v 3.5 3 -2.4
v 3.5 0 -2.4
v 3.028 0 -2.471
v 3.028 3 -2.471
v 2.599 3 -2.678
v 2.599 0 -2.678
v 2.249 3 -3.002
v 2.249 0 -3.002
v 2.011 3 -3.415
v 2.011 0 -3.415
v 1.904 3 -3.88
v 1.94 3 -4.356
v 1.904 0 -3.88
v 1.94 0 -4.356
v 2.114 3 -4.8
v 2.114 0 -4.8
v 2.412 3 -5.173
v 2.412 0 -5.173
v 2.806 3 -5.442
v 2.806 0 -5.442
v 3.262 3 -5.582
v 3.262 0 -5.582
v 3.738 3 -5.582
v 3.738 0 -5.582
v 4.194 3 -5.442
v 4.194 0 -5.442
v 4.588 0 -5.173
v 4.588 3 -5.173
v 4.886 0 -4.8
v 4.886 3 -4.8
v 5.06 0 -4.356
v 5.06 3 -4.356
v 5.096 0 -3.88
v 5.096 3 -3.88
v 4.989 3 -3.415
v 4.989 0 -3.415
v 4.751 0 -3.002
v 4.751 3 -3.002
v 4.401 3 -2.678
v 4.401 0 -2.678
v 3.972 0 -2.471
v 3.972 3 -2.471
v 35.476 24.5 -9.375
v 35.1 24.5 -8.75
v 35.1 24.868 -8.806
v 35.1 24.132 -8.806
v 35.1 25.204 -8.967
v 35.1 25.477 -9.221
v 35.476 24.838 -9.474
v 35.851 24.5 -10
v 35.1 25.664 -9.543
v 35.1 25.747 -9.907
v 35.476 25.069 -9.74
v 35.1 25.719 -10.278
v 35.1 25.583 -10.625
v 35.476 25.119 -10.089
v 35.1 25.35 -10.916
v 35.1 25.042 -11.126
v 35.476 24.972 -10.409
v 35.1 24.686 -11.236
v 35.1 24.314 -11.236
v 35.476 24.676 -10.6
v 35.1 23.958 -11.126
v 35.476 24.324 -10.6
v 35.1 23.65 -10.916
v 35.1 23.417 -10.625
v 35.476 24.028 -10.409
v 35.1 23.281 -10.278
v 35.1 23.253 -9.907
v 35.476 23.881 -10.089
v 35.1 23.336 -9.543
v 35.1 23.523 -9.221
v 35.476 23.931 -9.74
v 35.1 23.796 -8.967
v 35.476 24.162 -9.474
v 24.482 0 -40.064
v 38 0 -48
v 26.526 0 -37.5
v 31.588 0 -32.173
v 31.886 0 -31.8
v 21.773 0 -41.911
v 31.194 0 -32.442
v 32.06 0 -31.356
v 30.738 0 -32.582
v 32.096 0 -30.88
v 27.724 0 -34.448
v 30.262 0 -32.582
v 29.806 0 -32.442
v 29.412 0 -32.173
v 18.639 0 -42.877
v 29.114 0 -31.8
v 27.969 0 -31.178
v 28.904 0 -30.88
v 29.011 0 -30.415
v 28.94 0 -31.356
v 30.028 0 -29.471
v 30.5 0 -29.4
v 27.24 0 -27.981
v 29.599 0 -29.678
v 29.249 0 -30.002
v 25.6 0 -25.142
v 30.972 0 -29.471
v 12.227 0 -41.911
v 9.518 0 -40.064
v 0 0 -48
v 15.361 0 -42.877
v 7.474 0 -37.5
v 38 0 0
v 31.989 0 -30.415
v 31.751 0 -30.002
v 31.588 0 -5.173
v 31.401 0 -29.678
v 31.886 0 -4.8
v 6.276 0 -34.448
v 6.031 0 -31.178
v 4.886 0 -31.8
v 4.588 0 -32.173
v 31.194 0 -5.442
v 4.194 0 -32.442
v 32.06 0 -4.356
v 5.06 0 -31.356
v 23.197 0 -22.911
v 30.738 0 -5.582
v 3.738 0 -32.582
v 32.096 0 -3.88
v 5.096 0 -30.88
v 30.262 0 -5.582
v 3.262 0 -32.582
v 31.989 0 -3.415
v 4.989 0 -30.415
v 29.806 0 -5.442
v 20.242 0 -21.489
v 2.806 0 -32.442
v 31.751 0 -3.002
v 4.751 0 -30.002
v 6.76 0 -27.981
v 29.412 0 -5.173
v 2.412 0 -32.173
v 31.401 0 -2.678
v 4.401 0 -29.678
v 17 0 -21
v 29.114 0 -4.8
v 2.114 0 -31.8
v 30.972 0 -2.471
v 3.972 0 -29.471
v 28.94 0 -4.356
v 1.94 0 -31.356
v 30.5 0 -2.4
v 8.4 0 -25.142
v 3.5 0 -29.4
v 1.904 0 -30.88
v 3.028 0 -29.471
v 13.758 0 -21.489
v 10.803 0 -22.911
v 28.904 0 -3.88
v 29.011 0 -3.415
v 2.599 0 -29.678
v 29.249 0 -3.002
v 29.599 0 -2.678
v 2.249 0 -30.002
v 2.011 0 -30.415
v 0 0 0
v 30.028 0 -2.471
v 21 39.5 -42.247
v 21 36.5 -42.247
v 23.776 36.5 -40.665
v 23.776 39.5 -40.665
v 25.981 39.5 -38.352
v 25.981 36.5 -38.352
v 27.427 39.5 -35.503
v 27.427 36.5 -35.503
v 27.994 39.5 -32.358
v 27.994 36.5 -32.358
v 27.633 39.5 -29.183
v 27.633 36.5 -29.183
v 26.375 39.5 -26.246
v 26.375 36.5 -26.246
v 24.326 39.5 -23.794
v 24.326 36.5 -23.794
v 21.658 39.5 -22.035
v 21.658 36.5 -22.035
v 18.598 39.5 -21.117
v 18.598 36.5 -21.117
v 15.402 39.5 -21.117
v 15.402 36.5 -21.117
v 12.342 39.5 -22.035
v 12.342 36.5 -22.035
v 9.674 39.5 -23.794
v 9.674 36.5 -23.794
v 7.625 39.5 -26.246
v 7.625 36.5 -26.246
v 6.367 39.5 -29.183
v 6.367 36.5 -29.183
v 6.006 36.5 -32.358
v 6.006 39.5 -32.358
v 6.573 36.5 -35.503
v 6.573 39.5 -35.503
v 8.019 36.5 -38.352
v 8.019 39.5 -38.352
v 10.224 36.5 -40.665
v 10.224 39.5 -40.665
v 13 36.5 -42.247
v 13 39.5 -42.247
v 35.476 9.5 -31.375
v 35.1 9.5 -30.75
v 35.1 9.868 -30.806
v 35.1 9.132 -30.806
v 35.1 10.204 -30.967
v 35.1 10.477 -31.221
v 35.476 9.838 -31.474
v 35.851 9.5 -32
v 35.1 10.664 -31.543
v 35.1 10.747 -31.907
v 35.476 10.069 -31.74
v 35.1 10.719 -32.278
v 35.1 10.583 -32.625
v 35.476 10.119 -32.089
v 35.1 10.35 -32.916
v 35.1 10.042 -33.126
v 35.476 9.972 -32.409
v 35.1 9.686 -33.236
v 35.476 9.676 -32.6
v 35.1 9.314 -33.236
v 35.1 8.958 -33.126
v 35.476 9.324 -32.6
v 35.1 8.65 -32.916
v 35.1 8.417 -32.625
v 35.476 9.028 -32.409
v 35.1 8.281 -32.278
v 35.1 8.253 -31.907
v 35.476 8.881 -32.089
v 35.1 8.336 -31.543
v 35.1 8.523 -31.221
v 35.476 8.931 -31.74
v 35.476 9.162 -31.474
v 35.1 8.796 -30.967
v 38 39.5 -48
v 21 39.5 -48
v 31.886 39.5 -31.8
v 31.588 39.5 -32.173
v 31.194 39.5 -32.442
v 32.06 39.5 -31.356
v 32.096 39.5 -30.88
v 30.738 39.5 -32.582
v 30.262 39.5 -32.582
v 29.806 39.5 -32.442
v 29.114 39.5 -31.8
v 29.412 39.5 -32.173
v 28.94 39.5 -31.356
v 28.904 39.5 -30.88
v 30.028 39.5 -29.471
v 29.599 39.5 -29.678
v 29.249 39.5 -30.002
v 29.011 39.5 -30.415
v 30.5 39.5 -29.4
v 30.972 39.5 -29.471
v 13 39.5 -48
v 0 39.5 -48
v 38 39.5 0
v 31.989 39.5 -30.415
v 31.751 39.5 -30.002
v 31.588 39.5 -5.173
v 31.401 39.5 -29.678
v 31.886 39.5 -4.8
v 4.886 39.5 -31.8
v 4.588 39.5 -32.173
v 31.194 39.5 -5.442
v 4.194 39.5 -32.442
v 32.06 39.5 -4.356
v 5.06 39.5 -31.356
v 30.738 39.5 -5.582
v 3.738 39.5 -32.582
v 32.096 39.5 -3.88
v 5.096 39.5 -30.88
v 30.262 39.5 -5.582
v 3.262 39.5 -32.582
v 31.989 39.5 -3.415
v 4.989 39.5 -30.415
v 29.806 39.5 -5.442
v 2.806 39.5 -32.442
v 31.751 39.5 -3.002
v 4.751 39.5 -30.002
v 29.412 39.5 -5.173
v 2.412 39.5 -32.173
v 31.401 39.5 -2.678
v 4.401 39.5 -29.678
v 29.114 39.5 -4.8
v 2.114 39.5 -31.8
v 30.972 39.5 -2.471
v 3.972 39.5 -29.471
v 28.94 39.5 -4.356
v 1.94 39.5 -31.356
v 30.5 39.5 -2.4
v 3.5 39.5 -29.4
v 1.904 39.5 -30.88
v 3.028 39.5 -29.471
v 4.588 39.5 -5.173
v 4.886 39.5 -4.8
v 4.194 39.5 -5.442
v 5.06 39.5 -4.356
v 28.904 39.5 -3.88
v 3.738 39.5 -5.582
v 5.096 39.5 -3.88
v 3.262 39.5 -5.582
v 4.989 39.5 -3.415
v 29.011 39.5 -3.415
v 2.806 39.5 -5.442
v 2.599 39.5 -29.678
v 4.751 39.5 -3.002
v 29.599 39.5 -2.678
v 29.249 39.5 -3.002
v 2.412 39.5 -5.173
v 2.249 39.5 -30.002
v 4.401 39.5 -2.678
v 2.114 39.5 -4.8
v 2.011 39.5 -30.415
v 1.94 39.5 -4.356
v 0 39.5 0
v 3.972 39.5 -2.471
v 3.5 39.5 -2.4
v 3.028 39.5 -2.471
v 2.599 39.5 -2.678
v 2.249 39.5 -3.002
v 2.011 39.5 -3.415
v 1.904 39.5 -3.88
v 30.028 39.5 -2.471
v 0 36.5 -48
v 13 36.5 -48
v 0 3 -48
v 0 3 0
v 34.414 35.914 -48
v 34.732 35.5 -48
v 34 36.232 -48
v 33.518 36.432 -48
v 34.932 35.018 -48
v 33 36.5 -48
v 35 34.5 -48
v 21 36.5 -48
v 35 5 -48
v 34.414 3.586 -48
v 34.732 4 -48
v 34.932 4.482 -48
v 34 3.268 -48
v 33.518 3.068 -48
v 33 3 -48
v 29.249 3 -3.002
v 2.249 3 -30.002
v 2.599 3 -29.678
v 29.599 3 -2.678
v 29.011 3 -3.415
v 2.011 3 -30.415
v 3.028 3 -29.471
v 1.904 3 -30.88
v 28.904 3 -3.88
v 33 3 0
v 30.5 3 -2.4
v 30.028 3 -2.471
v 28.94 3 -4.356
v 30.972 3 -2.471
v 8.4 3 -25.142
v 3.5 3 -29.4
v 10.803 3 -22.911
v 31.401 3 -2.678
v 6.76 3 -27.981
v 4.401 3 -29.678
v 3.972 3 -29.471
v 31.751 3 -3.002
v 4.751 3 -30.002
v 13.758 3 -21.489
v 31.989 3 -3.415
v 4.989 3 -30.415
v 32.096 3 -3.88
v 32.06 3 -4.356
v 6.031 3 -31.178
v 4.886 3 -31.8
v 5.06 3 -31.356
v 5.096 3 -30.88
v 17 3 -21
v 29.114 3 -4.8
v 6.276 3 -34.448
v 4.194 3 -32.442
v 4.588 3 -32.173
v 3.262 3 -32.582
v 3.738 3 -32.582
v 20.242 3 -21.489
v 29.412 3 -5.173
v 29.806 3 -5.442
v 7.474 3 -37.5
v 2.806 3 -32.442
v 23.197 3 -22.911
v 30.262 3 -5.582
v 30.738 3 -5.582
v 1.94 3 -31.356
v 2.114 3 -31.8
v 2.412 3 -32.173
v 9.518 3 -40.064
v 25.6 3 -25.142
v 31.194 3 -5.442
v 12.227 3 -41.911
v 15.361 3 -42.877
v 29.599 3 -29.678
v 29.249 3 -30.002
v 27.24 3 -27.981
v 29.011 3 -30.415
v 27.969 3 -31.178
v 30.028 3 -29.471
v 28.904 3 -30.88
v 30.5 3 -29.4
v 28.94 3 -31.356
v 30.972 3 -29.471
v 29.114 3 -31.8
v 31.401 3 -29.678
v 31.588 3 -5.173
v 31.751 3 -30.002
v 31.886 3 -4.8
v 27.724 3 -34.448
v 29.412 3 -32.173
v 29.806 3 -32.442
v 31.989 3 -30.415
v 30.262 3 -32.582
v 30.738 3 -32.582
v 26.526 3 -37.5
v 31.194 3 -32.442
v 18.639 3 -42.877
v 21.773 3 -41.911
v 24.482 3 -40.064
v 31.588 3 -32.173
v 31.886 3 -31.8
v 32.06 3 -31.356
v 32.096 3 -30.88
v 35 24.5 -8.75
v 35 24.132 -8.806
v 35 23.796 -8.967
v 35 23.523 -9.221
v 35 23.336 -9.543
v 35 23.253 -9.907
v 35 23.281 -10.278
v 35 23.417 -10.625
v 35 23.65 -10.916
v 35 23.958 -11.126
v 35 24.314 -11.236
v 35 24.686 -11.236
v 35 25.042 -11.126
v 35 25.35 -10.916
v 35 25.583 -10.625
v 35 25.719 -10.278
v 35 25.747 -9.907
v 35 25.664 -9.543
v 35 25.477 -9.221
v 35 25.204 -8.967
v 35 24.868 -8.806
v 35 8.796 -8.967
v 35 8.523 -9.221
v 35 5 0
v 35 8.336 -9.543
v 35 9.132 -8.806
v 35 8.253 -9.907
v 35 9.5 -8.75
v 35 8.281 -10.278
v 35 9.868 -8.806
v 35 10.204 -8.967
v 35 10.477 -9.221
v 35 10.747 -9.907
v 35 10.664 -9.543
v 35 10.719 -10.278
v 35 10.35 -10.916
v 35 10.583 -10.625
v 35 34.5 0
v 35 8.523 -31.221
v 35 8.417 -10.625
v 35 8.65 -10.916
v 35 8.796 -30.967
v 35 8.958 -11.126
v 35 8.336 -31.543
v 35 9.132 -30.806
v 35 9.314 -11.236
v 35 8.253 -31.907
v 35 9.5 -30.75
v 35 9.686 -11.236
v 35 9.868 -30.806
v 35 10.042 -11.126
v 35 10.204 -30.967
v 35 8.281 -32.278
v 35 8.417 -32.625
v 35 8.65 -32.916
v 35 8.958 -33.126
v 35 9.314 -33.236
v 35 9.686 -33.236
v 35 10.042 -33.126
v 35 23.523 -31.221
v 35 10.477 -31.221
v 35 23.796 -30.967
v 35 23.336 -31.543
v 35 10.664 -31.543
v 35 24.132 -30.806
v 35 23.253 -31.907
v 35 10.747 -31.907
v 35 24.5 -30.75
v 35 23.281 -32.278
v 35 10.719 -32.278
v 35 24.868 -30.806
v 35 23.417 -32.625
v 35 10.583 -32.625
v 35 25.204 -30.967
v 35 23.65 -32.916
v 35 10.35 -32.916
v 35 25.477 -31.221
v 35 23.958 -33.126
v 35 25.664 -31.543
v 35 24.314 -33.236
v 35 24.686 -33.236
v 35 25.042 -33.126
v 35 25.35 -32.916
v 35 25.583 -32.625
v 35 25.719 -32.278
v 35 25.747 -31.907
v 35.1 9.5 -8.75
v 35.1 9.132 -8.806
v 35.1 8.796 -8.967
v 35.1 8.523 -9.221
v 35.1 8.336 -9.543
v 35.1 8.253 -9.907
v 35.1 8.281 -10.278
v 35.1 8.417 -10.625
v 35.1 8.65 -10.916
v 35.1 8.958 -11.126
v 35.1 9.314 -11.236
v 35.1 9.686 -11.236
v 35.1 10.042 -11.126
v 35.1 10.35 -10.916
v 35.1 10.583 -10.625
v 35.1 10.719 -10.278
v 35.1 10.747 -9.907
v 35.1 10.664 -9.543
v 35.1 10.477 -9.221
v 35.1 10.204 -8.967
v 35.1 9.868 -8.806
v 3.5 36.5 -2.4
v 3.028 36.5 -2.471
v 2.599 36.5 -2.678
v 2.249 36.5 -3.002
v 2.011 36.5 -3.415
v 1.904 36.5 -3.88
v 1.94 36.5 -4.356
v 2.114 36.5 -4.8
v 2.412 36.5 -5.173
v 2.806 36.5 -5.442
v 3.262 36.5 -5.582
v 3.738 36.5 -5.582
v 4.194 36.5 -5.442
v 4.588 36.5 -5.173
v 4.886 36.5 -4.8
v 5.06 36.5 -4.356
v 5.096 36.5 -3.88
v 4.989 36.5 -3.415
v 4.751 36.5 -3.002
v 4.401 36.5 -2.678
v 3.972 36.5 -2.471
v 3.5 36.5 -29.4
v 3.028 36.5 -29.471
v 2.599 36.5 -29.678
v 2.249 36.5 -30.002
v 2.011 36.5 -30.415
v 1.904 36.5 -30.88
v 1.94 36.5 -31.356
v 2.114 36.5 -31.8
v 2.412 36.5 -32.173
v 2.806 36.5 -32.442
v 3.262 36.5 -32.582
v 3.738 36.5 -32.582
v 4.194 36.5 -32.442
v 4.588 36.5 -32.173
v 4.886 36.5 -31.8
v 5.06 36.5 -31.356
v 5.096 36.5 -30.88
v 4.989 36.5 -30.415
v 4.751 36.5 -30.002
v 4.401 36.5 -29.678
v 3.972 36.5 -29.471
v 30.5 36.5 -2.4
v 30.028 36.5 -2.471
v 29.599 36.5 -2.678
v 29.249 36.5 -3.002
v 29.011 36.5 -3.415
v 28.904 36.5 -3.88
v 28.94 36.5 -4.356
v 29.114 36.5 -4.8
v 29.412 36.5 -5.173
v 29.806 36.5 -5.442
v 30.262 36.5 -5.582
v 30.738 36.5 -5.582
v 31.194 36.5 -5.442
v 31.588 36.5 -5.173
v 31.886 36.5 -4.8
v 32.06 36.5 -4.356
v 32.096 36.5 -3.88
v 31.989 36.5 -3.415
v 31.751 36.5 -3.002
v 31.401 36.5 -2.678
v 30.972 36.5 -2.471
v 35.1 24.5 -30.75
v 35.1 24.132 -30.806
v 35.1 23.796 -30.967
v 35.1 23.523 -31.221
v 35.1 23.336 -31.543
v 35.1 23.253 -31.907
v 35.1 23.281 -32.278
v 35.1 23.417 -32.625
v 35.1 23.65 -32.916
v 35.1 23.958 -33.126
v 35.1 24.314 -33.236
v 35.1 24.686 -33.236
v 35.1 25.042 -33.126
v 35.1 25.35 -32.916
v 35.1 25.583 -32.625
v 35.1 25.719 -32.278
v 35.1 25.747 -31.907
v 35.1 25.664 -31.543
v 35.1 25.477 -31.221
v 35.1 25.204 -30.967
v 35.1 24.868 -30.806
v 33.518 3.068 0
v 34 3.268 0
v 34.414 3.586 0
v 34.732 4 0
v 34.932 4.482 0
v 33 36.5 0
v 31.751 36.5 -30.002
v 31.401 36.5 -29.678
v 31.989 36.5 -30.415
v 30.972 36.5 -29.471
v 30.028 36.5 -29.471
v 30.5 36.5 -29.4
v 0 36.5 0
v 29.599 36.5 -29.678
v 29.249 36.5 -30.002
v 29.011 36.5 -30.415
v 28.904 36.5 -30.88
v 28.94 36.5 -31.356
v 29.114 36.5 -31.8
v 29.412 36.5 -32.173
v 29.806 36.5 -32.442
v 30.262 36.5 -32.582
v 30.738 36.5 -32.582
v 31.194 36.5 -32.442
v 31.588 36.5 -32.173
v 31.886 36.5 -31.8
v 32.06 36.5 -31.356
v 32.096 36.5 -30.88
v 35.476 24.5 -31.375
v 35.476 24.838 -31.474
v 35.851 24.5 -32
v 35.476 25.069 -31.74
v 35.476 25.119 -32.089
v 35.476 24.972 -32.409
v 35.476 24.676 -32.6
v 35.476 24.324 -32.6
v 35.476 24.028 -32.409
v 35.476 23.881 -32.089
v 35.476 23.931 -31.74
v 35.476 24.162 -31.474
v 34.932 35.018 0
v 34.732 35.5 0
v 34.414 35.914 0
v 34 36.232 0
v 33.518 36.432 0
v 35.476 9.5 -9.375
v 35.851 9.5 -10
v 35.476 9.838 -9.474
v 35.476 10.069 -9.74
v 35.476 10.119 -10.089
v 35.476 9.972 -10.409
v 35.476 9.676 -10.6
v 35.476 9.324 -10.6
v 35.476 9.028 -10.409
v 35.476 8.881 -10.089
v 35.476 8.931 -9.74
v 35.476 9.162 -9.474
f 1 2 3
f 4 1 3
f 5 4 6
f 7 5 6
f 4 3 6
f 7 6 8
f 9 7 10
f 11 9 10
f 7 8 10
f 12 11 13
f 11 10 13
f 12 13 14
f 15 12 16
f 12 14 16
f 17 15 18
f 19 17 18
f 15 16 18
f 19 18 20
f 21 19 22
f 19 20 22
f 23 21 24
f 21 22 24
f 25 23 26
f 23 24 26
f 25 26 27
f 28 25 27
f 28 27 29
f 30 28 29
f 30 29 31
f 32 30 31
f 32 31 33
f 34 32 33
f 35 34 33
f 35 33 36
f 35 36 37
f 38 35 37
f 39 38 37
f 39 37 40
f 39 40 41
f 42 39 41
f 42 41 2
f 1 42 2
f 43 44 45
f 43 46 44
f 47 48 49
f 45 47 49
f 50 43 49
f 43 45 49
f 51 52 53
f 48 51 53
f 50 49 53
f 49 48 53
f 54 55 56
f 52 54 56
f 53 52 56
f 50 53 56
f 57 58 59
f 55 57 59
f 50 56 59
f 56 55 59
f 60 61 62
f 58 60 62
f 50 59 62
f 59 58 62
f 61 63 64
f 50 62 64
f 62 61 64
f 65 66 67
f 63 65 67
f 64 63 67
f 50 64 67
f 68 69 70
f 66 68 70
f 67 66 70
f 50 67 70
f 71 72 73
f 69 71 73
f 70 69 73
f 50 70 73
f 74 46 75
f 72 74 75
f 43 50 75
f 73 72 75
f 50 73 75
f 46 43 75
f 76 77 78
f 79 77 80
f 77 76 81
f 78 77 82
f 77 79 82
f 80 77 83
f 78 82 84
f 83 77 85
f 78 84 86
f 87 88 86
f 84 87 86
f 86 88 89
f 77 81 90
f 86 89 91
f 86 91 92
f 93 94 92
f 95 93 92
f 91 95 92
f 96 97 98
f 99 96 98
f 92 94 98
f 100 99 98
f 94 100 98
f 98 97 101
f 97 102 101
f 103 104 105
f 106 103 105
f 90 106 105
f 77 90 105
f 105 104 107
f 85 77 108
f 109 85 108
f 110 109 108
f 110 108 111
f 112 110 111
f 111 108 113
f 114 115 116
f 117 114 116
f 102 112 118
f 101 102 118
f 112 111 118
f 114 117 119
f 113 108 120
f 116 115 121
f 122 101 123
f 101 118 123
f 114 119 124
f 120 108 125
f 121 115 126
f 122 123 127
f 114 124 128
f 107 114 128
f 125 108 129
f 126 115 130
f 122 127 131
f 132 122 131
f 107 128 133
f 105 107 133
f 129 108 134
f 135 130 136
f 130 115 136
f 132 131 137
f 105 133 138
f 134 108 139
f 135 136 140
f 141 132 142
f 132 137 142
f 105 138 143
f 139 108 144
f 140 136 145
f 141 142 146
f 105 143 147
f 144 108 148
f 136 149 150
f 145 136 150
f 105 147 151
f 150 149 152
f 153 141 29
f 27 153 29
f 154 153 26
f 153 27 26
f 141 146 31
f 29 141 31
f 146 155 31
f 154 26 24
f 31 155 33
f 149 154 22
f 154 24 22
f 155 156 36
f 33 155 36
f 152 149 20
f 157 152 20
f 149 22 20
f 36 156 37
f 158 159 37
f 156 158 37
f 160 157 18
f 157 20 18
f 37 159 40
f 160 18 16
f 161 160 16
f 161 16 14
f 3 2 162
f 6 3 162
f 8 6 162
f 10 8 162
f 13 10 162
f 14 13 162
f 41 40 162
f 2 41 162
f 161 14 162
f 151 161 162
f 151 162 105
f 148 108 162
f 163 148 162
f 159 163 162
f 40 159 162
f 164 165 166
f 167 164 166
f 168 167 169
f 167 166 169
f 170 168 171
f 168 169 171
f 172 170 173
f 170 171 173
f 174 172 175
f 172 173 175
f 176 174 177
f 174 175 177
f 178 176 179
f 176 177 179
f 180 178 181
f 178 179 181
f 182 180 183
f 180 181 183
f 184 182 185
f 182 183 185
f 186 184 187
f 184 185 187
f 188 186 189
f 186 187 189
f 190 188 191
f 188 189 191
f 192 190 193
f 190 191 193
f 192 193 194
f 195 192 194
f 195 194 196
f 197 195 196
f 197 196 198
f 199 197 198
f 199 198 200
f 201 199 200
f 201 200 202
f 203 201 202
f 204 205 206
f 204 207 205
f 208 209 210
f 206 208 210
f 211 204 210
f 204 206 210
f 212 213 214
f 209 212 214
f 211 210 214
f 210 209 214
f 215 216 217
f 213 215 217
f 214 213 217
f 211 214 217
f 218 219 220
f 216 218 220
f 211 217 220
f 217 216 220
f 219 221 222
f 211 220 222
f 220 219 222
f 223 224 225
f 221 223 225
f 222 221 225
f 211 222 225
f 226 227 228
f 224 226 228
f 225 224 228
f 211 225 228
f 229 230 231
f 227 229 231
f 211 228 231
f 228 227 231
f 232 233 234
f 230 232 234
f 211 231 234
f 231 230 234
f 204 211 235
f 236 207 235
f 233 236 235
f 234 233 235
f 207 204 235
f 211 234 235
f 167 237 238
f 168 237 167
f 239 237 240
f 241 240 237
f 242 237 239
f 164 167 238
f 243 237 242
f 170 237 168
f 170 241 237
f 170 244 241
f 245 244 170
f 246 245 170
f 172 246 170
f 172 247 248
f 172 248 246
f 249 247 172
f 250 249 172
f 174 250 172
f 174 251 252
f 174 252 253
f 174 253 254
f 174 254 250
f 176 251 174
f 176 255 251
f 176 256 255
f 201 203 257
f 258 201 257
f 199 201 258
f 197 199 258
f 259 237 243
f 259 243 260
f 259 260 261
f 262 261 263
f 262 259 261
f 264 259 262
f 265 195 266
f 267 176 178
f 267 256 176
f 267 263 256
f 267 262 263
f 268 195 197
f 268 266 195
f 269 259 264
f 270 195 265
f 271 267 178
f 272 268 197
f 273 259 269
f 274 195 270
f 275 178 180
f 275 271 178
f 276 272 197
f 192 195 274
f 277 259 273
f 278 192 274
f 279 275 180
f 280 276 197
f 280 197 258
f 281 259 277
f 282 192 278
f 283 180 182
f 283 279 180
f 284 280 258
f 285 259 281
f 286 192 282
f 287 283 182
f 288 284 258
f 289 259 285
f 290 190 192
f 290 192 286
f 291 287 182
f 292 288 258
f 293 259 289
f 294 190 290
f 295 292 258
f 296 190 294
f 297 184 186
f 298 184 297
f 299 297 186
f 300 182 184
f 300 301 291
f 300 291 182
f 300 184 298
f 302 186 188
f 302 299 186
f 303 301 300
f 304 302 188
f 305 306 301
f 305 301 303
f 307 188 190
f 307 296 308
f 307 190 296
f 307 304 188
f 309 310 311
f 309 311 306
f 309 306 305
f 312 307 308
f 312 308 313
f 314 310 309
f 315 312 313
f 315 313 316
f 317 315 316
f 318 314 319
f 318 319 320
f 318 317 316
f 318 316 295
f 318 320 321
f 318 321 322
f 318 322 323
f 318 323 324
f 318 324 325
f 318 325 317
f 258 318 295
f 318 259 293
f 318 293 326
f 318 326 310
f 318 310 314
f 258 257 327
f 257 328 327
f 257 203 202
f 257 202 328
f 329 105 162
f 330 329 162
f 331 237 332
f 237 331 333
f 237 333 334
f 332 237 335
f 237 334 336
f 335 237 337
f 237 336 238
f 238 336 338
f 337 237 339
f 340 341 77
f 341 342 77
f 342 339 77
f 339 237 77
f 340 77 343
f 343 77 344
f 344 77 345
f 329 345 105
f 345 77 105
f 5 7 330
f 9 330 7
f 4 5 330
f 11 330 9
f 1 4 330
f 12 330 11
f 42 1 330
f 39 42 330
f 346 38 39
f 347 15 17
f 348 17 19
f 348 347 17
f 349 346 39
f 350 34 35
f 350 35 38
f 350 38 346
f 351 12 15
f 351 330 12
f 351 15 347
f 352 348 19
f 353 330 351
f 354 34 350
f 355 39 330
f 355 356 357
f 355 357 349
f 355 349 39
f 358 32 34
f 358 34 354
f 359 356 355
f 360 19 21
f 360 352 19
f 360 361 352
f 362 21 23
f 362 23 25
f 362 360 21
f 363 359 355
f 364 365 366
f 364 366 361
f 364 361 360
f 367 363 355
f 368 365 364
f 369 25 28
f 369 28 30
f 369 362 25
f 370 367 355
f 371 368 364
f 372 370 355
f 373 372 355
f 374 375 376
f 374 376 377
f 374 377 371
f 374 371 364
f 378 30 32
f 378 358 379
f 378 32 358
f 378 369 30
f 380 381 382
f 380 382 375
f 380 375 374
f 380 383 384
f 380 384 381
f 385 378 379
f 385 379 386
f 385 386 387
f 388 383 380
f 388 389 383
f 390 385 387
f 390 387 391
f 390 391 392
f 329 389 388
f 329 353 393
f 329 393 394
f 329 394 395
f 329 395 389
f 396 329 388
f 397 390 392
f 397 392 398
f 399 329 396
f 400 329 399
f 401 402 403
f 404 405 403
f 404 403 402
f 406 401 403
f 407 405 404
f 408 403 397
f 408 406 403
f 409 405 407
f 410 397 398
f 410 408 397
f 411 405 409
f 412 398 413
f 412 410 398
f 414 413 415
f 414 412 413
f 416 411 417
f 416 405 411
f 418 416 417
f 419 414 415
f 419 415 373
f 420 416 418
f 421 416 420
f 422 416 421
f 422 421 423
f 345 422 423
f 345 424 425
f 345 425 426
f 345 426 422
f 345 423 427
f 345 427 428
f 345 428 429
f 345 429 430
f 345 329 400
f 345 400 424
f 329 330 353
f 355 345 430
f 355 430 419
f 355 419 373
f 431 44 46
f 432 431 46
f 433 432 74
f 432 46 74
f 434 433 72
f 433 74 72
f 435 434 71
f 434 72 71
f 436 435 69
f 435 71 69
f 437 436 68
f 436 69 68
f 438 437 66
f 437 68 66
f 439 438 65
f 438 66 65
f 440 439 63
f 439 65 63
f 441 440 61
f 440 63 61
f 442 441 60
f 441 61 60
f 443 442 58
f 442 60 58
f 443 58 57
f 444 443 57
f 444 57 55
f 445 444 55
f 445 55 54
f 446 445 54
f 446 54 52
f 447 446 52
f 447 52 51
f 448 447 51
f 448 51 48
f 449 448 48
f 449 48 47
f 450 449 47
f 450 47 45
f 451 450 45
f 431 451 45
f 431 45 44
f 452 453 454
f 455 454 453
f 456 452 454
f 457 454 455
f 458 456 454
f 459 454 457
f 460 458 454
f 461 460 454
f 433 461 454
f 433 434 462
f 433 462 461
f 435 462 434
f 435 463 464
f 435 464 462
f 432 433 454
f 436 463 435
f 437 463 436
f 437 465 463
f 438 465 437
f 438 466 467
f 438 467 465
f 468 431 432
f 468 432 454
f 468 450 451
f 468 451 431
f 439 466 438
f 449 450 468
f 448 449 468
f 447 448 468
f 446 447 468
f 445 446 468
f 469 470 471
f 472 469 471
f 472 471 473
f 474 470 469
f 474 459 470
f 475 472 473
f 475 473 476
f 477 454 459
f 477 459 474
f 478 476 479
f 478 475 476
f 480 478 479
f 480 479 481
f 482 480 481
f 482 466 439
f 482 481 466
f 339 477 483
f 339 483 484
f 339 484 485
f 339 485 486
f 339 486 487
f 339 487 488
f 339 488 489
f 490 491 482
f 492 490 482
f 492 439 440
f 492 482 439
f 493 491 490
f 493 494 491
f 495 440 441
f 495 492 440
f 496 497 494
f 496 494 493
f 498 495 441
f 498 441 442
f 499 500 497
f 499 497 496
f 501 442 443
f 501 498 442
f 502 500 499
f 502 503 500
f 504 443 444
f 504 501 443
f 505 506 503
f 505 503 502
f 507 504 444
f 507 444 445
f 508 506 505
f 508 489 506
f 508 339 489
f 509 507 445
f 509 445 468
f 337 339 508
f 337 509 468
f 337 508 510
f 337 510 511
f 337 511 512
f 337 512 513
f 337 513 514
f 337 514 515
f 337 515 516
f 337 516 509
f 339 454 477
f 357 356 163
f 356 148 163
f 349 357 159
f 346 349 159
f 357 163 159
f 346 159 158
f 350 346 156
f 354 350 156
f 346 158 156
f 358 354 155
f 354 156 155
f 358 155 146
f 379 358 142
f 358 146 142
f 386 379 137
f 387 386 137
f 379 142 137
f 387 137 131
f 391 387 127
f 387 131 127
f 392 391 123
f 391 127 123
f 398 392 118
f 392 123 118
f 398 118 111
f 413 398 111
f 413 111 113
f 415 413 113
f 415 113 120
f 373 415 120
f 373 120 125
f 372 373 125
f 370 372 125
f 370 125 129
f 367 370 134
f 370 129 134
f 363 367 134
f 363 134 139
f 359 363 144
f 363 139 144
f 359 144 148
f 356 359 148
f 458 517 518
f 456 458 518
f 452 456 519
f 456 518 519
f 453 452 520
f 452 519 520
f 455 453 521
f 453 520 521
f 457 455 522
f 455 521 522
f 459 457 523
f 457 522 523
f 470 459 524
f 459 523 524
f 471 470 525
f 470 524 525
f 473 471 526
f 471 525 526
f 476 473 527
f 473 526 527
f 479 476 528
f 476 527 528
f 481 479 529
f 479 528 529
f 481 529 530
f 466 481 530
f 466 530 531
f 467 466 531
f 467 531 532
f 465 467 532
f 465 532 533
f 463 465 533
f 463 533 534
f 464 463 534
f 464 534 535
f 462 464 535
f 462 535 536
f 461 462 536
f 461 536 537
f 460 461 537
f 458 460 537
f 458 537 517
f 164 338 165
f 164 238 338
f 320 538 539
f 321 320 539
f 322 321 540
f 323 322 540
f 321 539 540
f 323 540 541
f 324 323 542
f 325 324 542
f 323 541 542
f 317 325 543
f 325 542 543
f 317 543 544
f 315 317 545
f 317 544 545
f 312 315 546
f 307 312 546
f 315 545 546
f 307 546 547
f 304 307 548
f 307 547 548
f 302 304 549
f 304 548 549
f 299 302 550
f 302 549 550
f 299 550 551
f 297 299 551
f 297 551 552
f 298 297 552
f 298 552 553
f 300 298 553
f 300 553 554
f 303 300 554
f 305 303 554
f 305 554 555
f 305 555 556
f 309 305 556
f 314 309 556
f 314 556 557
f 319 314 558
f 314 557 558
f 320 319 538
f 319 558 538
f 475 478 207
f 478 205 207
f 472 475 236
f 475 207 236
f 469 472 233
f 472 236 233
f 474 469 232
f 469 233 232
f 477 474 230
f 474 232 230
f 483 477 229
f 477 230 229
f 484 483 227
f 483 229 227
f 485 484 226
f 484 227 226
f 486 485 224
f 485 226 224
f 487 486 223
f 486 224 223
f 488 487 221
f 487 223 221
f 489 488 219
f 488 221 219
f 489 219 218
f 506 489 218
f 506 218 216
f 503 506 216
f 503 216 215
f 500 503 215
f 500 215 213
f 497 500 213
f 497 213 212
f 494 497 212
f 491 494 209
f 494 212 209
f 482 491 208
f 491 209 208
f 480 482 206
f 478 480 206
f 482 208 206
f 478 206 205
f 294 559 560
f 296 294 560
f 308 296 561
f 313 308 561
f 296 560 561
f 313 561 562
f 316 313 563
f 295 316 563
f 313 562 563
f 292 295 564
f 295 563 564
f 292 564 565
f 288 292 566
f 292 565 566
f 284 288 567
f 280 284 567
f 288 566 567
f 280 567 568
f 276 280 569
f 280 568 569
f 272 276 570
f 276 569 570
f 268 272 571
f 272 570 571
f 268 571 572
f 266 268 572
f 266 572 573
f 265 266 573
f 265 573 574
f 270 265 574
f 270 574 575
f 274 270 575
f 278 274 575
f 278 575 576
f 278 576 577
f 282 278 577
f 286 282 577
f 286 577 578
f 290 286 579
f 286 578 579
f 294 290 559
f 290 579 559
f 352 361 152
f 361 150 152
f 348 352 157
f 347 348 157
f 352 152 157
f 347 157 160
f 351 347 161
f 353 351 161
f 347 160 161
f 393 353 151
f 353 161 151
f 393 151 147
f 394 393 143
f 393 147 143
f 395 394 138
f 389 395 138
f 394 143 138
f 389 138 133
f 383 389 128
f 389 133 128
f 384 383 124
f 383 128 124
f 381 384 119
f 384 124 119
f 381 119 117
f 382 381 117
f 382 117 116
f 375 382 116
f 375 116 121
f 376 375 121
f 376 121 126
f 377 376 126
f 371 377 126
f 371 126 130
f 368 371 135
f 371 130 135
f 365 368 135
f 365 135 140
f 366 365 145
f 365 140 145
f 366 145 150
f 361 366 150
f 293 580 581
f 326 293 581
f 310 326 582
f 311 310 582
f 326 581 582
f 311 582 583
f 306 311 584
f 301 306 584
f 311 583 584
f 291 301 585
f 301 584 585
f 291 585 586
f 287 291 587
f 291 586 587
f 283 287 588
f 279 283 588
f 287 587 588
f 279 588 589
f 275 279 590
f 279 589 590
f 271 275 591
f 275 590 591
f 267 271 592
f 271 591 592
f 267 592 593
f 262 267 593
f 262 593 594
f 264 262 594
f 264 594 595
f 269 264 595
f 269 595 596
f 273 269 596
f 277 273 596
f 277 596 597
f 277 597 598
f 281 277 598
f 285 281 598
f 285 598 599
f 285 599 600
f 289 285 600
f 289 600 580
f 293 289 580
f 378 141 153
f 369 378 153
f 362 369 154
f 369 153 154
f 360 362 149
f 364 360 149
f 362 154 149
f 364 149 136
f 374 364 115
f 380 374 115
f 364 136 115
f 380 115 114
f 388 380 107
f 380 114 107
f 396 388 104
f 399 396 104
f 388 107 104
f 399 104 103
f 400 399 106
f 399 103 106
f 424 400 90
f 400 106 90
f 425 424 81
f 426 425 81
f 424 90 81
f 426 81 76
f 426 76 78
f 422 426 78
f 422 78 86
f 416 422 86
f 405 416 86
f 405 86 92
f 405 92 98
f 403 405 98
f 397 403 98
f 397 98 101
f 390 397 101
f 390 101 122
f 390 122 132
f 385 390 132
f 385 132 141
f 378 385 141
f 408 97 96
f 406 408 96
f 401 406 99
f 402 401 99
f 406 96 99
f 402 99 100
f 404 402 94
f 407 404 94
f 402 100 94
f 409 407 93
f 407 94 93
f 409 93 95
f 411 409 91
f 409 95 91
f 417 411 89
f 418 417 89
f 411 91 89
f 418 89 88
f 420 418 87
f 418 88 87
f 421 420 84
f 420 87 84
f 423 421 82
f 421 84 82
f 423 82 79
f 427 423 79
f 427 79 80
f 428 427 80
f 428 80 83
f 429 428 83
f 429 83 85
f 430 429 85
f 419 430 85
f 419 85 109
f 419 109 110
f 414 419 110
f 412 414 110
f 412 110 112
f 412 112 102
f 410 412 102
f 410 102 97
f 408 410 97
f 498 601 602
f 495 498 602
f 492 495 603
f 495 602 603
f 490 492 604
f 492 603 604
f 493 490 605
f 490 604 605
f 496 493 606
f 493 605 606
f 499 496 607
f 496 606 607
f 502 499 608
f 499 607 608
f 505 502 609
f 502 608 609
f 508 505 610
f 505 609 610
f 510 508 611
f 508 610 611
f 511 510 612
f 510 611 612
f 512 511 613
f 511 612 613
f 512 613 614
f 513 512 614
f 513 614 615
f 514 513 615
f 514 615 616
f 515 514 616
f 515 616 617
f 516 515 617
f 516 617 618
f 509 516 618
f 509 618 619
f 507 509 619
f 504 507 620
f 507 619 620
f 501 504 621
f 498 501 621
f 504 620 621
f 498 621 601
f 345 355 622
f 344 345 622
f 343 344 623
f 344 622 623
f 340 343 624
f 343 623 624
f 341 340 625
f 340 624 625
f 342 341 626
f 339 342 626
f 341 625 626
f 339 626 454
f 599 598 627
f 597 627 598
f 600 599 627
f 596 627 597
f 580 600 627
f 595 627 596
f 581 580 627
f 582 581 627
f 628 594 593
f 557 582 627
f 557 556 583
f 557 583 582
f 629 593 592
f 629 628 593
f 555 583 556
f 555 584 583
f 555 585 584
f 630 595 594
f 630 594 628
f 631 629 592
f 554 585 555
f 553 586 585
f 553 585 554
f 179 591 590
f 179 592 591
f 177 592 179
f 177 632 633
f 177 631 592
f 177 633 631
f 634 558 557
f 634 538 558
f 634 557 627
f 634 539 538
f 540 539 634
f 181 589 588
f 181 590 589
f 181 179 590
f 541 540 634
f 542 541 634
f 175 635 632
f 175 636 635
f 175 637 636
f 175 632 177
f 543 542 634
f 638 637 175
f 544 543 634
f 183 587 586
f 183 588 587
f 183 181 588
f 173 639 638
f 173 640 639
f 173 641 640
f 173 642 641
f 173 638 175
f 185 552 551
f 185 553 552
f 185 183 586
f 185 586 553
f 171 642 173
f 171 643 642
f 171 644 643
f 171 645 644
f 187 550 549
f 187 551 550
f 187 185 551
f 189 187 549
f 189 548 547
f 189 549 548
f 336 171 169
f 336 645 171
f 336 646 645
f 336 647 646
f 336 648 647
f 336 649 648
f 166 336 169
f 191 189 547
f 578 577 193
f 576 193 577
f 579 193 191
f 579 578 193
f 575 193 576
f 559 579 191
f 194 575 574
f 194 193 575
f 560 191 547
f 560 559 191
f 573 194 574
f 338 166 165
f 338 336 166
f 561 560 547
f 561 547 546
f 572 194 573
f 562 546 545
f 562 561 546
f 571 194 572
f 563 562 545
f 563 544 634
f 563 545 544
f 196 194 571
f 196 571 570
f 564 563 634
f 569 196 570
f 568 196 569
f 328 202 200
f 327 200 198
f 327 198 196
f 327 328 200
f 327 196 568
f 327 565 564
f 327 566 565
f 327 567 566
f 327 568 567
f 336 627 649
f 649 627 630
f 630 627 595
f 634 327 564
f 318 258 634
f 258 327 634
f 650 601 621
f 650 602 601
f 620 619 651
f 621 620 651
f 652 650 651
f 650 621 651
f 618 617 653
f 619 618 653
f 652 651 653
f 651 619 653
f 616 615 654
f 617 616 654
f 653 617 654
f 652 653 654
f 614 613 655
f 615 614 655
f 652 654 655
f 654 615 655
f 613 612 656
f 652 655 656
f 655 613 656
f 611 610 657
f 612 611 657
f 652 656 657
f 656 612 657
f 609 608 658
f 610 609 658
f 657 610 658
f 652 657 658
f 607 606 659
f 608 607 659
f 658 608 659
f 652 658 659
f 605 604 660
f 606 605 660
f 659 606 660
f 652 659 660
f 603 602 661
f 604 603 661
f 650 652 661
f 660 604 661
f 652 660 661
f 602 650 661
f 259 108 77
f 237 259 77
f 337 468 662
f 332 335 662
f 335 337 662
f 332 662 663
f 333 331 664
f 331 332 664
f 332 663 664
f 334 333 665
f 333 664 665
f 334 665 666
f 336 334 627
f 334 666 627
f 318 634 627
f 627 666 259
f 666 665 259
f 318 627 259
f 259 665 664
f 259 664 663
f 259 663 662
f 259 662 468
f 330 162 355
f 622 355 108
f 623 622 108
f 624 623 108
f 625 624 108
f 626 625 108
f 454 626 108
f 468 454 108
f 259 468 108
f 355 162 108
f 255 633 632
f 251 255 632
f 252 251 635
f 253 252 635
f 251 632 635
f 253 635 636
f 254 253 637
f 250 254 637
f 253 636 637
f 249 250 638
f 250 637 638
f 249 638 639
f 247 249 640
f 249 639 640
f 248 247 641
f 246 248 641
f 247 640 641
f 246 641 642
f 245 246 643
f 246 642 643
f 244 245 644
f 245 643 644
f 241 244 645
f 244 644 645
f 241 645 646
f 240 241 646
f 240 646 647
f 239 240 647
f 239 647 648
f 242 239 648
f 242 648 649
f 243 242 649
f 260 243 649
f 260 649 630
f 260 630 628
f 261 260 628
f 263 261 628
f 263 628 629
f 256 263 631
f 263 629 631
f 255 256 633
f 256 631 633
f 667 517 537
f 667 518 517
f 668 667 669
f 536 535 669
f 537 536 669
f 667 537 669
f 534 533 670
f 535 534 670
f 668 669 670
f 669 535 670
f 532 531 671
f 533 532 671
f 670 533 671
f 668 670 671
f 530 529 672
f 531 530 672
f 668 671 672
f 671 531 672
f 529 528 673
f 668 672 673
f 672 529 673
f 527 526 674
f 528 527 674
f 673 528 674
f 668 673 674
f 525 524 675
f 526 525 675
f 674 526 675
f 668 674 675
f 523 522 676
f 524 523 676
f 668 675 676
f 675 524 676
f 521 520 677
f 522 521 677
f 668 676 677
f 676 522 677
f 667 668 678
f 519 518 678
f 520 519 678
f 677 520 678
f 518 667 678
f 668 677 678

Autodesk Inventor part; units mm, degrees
ref_plane "YZ Plane" through (0, 0, 0) normal (1, 0, 0) x (0, 1, 0)
ref_plane "XZ Plane" through (0, 0, 0) normal (0, 1, 0) x (-1, 0, 0)
ref_plane "XY Plane" through (0, 0, 0) normal (0, 0, 1) x (1, 0, 0)
sketch "スケッチ1" plane through (0, 0, 0) normal (0, 1, 0) x (-1, 0, 0)
  line L0 (0, 0) -> (-38, 0)
  line L1 (-38, 0) -> (-38, -48)
  line L2 (-38, -48) -> (0, -48)
  line L3 (0, -48) -> (0, 0)
  dimension "d0" = 48
  dimension "d1" = 38
extrude "押し出し1" add sketch "スケッチ1" along normal blind 39.5
sketch "スケッチ2" plane through (38, 0, -48) normal (0, 0, -1) x (-1, 0, 0)
  line L0 (3, 36.5) -> (59.072, 36.5)
  line L1 (59.072, 36.5) -> (59.072, 3)
  line L2 (59.072, 3) -> (3, 3)
  line L3 (3, 3) -> (3, 36.5)
  line L4 (0, 39.5) -> (38, 39.5) projected
  line L5 (0, 0) -> (38, 0) projected
  line L6 (0, 0) -> (0, 39.5) projected
  dimension "d4" = 33.5
  dimension "d6" = 3
  dimension "d7" = 3
extrude "押し出し2" cut sketch "スケッチ2" against normal blind 100
sketch "スケッチ3" plane through (0, 39.5, 0) normal (0, 1, 0) x (1, 0, 0)
  line L0 (38, 48) -> (0, 48) projected
  line L1 (38, 0) -> (38, 48) projected
  point P0 (0, 0)
  point P1 (17, 32)
  dimension "d10" = 16
  dimension "d11" = 21
hole "穴1" at (17, 39.5, -32) direction (0, -1, 0) diameter 22 end through all
sketch "スケッチ4" plane through (0, 39.5, 0) normal (0, 1, 0) x (1, 0, 0)
  line L0 (0, 0) -> (38, 0) projected
  line L1 (38, 0) -> (38, 48) projected
  point P0 (30.5, 4)
  point P1 (30.5, 31)
  point P2 (3.5, 4)
  point P3 (3.5, 31)
  point P4 (3.5, 4)
  dimension "d19" = 4
  dimension "d20" = 7.5
  dimension "d23" = 27
  dimension "d26" = 27
hole "穴2" at (30.5, 39.5, -4) at (30.5, 39.5, -31) at (3.5, 39.5, -31) at (3.5, 39.5, -4) direction (0, -1, 0) diameter 3.2 end through all
sketch "スケッチ6" plane through (38, 0, 0) normal (1, 0, 0) x (0, 0, -1)
  line L0 (0, 39.5) -> (48, 39.5) projected
  line L1 (0, 0) -> (0, 39.5) projected
  point P0 (10, 24.5)
  point P1 (32, 24.5)
  point P2 (10, 9.5)
  point P3 (32, 9.5)
  dimension "d45" = 15
  dimension "d46" = 10
  dimension "d49" = 22
  dimension "d52" = 15
fillet "フィレット1" radius 2 2 edges at (35, 3, -24) (35, 36.5, -24)
sketch "スケッチ7" plane through (0, 39.5, 0) normal (0, 1, 0) x (1, 0, 0)
  line L0 (38, 48) -> (0, 48) projected
  line L1 (13, 48) -> (21, 48)
  line L2 (21, 48) -> (21, 39.3329)
  line L3 (21, 39.3329) -> (13, 39.3329)
  line L4 (13, 39.3329) -> (13, 48)
  circle A0 centre (17, 32) radius 11 projected
  point P0 (0, 0)
  point P1 (13, 42.247)
  point P2 (21, 42.247)
  dimension "d69" = 8
  dimension "d70" = 4
extrude "押し出し3" cut sketch "スケッチ7" against normal blind 3 contours L2 A0 L4 L0
sketch "スケッチ8" plane through (35, 5, -48) normal (-1, 0, 0) x (0, 0, 1)
  line L0 (16, 4.5) -> (38, 4.5)
  line L1 (38, 4.5) -> (38, 19.5)
  line L2 (38, 19.5) -> (16, 19.5)
  line L3 (16, 19.5) -> (16, 4.5)
  line L4 (48, 34.5) -> (48, 0) projected
  line L5 (48, 34.5) -> (0, 34.5) projected
  point P0 (48, -5)
  point P1 (48, 29.5)
  dimension "d73" = 10
  dimension "d74" = 22
  dimension "d75" = 15
  dimension "d76" = 15
hole "穴5" at (35, 9.5, -10) at (35, 9.5, -32) at (35, 24.5, -32) at (35, 24.5, -10) direction (1, 0, 0) diameter 2.5 depth 0.1 tip angle 118
properties part number "サーボモータ固定用２軸目3mm改_printer"
